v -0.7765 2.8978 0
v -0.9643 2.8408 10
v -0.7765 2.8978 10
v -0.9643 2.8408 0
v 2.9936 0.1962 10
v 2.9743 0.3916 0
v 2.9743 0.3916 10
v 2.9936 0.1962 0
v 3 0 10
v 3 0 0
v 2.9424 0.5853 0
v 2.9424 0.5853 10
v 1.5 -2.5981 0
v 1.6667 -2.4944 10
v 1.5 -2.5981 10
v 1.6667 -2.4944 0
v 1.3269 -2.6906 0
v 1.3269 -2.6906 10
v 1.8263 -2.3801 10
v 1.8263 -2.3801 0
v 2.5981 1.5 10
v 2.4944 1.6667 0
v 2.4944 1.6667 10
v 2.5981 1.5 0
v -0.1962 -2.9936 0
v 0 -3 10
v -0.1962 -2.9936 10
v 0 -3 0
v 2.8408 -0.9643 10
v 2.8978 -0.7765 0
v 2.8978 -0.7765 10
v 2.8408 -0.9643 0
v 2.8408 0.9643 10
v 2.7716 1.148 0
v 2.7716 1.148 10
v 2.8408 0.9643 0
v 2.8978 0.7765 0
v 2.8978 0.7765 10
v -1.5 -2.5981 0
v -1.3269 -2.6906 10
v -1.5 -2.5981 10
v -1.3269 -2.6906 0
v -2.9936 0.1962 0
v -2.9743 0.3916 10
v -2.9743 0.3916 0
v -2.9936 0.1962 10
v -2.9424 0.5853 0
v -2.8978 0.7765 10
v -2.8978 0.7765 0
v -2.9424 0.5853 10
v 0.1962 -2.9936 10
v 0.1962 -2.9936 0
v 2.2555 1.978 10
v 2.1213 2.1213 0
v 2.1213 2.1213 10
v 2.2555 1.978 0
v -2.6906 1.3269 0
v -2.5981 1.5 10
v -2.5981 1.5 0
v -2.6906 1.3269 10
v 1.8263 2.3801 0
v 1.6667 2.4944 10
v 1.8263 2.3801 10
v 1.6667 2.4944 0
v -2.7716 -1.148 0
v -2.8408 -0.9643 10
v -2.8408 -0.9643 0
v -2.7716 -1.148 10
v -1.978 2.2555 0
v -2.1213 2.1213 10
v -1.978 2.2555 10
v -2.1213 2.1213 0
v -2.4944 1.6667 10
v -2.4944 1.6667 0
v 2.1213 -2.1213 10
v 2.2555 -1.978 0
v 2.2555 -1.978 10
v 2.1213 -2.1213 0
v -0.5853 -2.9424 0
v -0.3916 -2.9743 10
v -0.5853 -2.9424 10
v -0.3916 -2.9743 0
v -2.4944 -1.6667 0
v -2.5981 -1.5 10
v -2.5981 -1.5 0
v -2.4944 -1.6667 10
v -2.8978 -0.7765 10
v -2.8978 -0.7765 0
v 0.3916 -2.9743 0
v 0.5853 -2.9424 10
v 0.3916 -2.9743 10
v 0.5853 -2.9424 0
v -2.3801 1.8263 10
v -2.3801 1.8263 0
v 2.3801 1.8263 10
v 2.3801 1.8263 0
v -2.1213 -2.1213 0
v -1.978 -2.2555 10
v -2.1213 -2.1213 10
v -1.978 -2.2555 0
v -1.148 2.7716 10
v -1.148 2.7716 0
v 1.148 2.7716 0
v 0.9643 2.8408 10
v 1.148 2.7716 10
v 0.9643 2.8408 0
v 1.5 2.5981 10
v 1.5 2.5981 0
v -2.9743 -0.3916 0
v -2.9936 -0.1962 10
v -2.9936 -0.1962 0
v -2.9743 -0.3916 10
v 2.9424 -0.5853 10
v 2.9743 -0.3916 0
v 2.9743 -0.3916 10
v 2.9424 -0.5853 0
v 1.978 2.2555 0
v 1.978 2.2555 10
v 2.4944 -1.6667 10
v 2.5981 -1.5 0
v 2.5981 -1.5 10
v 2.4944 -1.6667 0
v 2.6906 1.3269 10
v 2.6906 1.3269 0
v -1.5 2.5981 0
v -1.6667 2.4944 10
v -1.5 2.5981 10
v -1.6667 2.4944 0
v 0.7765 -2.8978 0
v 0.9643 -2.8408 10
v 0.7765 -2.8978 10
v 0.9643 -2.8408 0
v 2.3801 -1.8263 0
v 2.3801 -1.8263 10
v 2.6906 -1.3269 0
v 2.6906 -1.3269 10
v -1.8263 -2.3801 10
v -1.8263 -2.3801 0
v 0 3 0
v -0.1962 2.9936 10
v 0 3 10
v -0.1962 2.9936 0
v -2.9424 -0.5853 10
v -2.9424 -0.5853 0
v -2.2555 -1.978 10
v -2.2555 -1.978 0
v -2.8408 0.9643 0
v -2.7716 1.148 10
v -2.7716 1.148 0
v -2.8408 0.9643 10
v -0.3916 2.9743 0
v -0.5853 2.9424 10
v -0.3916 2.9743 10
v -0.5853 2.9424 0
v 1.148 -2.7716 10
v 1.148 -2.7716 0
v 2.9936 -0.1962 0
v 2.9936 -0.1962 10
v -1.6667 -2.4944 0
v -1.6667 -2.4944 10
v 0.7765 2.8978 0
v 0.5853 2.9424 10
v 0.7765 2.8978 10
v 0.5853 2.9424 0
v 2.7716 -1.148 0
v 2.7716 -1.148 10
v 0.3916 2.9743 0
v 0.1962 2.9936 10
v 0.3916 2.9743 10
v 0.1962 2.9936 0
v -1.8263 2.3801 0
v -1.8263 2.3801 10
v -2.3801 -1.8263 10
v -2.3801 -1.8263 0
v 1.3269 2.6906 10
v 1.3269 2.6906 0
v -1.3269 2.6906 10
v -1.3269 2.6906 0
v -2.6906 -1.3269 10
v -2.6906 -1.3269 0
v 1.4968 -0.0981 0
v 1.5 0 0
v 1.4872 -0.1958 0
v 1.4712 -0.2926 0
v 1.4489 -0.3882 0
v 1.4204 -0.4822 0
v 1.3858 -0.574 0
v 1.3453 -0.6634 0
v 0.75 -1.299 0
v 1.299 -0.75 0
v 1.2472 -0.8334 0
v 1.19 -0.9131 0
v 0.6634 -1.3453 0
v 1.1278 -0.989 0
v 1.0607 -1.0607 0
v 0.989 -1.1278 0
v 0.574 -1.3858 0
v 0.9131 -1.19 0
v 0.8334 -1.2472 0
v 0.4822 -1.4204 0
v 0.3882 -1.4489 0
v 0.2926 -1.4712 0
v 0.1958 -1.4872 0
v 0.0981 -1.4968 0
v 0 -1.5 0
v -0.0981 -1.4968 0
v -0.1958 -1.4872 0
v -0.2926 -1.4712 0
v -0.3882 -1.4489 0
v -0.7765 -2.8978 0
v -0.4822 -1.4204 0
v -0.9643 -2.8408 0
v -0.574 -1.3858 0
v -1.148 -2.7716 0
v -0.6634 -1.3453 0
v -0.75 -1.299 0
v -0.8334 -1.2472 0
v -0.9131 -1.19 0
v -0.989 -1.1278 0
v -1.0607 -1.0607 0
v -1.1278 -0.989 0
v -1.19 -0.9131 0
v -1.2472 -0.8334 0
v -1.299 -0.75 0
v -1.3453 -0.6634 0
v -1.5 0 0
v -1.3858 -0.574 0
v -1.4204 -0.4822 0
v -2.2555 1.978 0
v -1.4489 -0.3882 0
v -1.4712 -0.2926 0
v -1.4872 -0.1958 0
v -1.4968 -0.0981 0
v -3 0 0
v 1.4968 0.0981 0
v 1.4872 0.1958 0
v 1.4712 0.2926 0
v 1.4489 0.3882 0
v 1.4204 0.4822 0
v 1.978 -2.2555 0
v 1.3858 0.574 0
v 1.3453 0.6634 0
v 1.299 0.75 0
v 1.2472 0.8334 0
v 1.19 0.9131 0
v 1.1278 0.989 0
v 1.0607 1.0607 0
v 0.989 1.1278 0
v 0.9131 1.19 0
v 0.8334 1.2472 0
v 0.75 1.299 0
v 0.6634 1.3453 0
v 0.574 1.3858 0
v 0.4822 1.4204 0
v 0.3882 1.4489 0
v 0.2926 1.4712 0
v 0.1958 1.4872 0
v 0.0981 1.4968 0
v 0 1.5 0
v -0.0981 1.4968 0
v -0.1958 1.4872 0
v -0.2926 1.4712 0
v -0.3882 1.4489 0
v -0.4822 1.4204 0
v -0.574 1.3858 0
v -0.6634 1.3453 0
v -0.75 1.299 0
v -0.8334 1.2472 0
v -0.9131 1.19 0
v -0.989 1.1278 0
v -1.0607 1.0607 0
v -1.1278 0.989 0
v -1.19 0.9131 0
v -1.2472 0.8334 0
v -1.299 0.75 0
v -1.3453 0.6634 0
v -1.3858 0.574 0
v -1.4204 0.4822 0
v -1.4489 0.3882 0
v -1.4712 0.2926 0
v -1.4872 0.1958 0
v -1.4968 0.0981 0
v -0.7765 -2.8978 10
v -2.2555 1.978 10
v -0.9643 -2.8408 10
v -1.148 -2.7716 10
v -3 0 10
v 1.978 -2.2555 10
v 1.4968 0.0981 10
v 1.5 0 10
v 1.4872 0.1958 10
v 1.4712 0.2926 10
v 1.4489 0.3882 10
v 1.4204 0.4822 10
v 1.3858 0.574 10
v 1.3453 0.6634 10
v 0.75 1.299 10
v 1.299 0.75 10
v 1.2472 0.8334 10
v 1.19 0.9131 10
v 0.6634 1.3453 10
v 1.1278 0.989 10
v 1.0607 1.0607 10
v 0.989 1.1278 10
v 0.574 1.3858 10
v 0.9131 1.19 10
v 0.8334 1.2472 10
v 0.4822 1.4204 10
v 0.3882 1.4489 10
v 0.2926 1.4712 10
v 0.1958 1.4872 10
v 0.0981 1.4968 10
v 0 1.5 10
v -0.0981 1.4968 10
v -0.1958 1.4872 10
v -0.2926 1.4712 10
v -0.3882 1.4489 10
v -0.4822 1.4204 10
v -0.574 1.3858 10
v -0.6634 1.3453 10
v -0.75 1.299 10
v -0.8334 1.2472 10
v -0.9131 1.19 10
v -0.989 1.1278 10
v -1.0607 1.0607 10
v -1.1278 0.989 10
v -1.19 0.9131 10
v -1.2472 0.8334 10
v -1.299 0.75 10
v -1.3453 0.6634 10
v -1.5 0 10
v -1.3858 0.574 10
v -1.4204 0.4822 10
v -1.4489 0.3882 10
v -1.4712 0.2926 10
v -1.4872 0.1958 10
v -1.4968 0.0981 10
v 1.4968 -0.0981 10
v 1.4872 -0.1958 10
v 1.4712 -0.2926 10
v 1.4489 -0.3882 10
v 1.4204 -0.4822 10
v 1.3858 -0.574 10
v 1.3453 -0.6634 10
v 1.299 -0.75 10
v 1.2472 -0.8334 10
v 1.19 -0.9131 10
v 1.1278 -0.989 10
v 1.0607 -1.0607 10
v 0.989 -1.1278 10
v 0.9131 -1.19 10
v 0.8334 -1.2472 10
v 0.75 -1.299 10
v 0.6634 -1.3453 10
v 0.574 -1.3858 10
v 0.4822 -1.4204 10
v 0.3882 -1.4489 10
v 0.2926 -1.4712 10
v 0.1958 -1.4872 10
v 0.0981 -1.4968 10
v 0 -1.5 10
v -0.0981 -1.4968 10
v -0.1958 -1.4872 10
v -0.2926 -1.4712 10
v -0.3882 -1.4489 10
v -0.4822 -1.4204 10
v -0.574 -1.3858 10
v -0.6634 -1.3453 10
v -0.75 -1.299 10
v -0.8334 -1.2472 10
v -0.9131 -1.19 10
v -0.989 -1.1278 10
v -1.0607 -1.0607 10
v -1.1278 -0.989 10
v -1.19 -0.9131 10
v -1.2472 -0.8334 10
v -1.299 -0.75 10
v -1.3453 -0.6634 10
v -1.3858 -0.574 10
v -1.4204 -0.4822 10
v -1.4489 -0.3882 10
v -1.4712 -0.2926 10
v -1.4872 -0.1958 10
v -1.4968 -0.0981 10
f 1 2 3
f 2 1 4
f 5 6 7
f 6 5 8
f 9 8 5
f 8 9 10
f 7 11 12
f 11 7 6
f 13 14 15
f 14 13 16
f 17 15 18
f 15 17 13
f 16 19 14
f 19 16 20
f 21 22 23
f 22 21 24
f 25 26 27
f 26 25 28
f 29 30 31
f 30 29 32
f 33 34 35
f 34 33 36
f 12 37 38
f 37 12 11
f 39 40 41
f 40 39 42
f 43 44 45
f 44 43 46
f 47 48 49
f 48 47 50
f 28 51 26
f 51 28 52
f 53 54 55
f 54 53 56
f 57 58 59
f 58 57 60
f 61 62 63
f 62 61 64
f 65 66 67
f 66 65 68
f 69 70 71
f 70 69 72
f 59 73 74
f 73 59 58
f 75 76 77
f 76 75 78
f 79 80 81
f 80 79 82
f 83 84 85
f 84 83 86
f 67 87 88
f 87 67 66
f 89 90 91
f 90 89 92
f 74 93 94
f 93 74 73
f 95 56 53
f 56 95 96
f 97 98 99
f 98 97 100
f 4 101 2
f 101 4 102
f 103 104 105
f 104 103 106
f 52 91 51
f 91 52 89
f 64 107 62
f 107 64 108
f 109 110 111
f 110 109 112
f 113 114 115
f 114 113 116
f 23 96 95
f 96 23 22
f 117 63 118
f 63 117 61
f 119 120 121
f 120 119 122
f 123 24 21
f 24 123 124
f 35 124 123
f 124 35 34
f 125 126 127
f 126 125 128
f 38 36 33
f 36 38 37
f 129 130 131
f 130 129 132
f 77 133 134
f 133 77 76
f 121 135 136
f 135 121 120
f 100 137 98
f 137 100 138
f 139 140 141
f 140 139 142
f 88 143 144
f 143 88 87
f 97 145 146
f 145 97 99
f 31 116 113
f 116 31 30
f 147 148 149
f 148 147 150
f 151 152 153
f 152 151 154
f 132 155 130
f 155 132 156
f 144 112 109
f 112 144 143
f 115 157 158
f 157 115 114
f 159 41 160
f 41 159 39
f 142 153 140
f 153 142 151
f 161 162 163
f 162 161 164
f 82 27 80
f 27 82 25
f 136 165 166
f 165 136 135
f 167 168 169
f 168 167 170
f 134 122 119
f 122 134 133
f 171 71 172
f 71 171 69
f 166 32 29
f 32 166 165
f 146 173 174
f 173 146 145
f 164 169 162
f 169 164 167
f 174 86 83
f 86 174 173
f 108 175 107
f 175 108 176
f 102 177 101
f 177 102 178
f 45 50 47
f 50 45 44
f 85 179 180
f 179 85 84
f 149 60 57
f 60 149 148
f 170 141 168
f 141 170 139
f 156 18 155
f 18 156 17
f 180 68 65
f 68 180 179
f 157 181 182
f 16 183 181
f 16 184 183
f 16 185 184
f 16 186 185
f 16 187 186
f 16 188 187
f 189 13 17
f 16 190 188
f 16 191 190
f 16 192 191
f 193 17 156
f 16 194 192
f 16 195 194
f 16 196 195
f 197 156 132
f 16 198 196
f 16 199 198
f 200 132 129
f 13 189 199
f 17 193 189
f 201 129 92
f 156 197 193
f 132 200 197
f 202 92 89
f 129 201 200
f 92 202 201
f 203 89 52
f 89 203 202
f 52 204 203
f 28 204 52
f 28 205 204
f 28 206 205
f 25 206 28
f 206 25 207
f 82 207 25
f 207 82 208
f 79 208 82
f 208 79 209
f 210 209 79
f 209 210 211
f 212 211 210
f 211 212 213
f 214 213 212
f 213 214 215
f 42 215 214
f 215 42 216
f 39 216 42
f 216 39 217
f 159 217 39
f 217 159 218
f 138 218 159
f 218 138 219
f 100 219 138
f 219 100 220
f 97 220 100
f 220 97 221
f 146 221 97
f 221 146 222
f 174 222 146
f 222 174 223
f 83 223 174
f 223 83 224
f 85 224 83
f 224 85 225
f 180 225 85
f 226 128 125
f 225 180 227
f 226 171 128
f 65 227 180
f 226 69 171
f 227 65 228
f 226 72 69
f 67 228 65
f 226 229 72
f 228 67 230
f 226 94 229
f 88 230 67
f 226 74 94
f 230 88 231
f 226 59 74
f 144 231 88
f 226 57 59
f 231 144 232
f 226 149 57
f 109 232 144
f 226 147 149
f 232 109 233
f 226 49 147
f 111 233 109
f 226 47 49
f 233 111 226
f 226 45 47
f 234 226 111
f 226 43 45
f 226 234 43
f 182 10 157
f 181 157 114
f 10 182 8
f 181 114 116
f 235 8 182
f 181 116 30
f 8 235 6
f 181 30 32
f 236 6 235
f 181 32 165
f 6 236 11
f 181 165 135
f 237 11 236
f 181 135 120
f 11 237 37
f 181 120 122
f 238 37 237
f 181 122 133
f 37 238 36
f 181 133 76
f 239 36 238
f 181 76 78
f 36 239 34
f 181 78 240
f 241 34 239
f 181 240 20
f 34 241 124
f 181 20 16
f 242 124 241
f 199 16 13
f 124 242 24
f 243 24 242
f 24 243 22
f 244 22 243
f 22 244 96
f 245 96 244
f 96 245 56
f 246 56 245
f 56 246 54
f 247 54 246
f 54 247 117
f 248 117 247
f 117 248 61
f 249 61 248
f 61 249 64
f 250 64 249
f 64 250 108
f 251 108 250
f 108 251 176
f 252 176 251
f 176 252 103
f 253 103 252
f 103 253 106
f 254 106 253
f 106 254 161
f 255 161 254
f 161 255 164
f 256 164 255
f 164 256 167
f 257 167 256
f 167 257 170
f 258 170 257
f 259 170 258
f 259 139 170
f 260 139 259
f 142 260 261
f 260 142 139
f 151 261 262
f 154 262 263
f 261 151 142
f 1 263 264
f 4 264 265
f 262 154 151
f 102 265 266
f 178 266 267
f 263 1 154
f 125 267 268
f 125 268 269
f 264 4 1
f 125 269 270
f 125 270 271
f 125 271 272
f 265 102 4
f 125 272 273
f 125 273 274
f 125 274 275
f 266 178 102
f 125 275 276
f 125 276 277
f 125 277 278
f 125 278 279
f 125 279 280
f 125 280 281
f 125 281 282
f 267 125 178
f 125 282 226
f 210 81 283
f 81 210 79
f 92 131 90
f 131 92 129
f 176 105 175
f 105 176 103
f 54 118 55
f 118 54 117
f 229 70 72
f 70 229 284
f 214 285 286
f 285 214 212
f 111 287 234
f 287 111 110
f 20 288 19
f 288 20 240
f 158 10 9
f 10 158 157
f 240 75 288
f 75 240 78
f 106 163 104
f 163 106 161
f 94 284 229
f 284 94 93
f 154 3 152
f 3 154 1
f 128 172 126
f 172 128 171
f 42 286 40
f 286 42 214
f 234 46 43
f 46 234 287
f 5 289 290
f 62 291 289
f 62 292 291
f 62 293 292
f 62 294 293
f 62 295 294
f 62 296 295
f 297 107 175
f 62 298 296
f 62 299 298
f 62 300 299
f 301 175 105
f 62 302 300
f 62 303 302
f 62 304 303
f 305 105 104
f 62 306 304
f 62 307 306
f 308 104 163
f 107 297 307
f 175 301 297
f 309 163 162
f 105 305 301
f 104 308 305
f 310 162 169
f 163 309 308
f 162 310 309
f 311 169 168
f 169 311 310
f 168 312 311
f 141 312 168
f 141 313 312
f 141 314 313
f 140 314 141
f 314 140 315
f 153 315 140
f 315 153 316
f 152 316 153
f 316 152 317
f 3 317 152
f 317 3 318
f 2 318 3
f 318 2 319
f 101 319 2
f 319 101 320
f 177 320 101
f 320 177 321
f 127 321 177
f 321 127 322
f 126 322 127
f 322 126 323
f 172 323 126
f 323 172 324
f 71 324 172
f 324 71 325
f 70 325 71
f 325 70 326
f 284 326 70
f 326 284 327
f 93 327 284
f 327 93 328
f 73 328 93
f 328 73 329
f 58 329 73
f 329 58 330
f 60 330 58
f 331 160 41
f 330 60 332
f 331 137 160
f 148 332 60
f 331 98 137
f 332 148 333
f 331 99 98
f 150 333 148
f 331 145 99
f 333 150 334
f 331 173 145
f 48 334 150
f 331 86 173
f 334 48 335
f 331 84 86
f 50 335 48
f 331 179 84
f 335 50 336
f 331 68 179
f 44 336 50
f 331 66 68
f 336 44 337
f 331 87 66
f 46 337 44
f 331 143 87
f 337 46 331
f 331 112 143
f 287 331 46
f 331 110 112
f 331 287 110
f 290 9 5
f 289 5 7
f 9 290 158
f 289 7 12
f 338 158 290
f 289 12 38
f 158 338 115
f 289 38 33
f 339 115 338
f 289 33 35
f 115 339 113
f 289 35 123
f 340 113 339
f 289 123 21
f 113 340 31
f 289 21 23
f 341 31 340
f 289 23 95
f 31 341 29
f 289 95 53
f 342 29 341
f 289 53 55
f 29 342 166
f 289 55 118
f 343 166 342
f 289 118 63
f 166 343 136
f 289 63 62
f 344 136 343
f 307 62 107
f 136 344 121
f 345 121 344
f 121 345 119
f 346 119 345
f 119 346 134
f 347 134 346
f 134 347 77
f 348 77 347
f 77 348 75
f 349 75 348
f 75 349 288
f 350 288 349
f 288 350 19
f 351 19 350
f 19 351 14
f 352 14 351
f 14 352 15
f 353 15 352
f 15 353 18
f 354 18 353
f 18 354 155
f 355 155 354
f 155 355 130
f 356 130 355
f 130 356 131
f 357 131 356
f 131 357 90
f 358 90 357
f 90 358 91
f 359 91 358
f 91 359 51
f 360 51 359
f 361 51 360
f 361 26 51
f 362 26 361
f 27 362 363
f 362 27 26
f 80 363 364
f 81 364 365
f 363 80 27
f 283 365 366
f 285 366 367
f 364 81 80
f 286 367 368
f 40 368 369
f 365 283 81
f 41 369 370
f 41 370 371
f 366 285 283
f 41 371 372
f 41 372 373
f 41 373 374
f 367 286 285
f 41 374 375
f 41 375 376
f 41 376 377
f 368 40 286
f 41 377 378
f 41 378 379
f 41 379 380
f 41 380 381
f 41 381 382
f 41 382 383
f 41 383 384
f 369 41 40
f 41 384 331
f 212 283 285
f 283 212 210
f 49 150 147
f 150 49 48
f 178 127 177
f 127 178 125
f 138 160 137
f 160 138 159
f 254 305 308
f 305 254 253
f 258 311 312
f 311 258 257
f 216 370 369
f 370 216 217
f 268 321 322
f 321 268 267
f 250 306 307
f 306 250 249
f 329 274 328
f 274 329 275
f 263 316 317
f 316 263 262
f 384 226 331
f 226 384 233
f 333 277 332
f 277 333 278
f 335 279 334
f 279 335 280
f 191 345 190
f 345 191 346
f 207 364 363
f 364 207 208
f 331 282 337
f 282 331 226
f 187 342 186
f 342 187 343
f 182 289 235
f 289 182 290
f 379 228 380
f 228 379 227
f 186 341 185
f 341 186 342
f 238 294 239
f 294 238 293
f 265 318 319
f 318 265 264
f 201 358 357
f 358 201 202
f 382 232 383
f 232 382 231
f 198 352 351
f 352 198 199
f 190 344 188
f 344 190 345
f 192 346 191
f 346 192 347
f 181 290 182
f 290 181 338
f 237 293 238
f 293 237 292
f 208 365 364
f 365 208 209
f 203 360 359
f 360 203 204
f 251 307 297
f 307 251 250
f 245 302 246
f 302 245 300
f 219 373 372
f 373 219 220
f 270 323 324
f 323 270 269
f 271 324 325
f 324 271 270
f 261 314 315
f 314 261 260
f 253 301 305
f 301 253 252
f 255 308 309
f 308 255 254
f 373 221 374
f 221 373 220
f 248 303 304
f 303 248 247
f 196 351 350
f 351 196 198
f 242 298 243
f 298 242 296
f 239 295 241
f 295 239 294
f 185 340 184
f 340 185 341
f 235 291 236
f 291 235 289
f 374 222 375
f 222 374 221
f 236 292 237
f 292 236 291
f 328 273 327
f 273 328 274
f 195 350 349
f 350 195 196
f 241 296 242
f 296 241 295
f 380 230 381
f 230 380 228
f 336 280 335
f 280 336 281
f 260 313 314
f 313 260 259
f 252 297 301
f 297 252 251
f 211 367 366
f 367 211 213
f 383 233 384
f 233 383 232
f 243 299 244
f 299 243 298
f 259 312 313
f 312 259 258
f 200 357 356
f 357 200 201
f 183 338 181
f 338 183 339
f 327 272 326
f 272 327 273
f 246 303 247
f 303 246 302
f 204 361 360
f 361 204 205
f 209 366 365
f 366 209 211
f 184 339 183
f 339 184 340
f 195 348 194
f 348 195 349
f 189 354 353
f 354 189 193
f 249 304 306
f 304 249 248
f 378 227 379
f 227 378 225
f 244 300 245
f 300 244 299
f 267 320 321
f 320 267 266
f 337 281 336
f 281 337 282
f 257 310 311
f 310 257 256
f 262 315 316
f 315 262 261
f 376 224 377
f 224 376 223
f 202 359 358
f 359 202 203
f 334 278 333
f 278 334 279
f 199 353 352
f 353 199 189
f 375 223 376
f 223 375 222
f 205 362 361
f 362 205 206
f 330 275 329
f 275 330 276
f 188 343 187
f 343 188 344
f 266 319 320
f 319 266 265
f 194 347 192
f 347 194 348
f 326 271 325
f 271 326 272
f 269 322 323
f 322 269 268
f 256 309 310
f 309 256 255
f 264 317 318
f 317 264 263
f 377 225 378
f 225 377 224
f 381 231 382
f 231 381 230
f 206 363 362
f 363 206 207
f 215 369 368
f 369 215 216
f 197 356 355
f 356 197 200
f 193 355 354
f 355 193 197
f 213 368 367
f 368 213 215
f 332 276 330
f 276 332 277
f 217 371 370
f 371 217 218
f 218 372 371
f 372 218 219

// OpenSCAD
$fn = 96;

thread_d = 3.0;      // mm (nominal thread diameter)
length   = 10.0;     // mm
outer_d  = 6.0;      // mm (fallback since diameter was "None")

difference() {
  cylinder(d = outer_d, h = length);
  translate([0,0,-0.2])
    cylinder(d = thread_d, h = length + 0.4);
}
